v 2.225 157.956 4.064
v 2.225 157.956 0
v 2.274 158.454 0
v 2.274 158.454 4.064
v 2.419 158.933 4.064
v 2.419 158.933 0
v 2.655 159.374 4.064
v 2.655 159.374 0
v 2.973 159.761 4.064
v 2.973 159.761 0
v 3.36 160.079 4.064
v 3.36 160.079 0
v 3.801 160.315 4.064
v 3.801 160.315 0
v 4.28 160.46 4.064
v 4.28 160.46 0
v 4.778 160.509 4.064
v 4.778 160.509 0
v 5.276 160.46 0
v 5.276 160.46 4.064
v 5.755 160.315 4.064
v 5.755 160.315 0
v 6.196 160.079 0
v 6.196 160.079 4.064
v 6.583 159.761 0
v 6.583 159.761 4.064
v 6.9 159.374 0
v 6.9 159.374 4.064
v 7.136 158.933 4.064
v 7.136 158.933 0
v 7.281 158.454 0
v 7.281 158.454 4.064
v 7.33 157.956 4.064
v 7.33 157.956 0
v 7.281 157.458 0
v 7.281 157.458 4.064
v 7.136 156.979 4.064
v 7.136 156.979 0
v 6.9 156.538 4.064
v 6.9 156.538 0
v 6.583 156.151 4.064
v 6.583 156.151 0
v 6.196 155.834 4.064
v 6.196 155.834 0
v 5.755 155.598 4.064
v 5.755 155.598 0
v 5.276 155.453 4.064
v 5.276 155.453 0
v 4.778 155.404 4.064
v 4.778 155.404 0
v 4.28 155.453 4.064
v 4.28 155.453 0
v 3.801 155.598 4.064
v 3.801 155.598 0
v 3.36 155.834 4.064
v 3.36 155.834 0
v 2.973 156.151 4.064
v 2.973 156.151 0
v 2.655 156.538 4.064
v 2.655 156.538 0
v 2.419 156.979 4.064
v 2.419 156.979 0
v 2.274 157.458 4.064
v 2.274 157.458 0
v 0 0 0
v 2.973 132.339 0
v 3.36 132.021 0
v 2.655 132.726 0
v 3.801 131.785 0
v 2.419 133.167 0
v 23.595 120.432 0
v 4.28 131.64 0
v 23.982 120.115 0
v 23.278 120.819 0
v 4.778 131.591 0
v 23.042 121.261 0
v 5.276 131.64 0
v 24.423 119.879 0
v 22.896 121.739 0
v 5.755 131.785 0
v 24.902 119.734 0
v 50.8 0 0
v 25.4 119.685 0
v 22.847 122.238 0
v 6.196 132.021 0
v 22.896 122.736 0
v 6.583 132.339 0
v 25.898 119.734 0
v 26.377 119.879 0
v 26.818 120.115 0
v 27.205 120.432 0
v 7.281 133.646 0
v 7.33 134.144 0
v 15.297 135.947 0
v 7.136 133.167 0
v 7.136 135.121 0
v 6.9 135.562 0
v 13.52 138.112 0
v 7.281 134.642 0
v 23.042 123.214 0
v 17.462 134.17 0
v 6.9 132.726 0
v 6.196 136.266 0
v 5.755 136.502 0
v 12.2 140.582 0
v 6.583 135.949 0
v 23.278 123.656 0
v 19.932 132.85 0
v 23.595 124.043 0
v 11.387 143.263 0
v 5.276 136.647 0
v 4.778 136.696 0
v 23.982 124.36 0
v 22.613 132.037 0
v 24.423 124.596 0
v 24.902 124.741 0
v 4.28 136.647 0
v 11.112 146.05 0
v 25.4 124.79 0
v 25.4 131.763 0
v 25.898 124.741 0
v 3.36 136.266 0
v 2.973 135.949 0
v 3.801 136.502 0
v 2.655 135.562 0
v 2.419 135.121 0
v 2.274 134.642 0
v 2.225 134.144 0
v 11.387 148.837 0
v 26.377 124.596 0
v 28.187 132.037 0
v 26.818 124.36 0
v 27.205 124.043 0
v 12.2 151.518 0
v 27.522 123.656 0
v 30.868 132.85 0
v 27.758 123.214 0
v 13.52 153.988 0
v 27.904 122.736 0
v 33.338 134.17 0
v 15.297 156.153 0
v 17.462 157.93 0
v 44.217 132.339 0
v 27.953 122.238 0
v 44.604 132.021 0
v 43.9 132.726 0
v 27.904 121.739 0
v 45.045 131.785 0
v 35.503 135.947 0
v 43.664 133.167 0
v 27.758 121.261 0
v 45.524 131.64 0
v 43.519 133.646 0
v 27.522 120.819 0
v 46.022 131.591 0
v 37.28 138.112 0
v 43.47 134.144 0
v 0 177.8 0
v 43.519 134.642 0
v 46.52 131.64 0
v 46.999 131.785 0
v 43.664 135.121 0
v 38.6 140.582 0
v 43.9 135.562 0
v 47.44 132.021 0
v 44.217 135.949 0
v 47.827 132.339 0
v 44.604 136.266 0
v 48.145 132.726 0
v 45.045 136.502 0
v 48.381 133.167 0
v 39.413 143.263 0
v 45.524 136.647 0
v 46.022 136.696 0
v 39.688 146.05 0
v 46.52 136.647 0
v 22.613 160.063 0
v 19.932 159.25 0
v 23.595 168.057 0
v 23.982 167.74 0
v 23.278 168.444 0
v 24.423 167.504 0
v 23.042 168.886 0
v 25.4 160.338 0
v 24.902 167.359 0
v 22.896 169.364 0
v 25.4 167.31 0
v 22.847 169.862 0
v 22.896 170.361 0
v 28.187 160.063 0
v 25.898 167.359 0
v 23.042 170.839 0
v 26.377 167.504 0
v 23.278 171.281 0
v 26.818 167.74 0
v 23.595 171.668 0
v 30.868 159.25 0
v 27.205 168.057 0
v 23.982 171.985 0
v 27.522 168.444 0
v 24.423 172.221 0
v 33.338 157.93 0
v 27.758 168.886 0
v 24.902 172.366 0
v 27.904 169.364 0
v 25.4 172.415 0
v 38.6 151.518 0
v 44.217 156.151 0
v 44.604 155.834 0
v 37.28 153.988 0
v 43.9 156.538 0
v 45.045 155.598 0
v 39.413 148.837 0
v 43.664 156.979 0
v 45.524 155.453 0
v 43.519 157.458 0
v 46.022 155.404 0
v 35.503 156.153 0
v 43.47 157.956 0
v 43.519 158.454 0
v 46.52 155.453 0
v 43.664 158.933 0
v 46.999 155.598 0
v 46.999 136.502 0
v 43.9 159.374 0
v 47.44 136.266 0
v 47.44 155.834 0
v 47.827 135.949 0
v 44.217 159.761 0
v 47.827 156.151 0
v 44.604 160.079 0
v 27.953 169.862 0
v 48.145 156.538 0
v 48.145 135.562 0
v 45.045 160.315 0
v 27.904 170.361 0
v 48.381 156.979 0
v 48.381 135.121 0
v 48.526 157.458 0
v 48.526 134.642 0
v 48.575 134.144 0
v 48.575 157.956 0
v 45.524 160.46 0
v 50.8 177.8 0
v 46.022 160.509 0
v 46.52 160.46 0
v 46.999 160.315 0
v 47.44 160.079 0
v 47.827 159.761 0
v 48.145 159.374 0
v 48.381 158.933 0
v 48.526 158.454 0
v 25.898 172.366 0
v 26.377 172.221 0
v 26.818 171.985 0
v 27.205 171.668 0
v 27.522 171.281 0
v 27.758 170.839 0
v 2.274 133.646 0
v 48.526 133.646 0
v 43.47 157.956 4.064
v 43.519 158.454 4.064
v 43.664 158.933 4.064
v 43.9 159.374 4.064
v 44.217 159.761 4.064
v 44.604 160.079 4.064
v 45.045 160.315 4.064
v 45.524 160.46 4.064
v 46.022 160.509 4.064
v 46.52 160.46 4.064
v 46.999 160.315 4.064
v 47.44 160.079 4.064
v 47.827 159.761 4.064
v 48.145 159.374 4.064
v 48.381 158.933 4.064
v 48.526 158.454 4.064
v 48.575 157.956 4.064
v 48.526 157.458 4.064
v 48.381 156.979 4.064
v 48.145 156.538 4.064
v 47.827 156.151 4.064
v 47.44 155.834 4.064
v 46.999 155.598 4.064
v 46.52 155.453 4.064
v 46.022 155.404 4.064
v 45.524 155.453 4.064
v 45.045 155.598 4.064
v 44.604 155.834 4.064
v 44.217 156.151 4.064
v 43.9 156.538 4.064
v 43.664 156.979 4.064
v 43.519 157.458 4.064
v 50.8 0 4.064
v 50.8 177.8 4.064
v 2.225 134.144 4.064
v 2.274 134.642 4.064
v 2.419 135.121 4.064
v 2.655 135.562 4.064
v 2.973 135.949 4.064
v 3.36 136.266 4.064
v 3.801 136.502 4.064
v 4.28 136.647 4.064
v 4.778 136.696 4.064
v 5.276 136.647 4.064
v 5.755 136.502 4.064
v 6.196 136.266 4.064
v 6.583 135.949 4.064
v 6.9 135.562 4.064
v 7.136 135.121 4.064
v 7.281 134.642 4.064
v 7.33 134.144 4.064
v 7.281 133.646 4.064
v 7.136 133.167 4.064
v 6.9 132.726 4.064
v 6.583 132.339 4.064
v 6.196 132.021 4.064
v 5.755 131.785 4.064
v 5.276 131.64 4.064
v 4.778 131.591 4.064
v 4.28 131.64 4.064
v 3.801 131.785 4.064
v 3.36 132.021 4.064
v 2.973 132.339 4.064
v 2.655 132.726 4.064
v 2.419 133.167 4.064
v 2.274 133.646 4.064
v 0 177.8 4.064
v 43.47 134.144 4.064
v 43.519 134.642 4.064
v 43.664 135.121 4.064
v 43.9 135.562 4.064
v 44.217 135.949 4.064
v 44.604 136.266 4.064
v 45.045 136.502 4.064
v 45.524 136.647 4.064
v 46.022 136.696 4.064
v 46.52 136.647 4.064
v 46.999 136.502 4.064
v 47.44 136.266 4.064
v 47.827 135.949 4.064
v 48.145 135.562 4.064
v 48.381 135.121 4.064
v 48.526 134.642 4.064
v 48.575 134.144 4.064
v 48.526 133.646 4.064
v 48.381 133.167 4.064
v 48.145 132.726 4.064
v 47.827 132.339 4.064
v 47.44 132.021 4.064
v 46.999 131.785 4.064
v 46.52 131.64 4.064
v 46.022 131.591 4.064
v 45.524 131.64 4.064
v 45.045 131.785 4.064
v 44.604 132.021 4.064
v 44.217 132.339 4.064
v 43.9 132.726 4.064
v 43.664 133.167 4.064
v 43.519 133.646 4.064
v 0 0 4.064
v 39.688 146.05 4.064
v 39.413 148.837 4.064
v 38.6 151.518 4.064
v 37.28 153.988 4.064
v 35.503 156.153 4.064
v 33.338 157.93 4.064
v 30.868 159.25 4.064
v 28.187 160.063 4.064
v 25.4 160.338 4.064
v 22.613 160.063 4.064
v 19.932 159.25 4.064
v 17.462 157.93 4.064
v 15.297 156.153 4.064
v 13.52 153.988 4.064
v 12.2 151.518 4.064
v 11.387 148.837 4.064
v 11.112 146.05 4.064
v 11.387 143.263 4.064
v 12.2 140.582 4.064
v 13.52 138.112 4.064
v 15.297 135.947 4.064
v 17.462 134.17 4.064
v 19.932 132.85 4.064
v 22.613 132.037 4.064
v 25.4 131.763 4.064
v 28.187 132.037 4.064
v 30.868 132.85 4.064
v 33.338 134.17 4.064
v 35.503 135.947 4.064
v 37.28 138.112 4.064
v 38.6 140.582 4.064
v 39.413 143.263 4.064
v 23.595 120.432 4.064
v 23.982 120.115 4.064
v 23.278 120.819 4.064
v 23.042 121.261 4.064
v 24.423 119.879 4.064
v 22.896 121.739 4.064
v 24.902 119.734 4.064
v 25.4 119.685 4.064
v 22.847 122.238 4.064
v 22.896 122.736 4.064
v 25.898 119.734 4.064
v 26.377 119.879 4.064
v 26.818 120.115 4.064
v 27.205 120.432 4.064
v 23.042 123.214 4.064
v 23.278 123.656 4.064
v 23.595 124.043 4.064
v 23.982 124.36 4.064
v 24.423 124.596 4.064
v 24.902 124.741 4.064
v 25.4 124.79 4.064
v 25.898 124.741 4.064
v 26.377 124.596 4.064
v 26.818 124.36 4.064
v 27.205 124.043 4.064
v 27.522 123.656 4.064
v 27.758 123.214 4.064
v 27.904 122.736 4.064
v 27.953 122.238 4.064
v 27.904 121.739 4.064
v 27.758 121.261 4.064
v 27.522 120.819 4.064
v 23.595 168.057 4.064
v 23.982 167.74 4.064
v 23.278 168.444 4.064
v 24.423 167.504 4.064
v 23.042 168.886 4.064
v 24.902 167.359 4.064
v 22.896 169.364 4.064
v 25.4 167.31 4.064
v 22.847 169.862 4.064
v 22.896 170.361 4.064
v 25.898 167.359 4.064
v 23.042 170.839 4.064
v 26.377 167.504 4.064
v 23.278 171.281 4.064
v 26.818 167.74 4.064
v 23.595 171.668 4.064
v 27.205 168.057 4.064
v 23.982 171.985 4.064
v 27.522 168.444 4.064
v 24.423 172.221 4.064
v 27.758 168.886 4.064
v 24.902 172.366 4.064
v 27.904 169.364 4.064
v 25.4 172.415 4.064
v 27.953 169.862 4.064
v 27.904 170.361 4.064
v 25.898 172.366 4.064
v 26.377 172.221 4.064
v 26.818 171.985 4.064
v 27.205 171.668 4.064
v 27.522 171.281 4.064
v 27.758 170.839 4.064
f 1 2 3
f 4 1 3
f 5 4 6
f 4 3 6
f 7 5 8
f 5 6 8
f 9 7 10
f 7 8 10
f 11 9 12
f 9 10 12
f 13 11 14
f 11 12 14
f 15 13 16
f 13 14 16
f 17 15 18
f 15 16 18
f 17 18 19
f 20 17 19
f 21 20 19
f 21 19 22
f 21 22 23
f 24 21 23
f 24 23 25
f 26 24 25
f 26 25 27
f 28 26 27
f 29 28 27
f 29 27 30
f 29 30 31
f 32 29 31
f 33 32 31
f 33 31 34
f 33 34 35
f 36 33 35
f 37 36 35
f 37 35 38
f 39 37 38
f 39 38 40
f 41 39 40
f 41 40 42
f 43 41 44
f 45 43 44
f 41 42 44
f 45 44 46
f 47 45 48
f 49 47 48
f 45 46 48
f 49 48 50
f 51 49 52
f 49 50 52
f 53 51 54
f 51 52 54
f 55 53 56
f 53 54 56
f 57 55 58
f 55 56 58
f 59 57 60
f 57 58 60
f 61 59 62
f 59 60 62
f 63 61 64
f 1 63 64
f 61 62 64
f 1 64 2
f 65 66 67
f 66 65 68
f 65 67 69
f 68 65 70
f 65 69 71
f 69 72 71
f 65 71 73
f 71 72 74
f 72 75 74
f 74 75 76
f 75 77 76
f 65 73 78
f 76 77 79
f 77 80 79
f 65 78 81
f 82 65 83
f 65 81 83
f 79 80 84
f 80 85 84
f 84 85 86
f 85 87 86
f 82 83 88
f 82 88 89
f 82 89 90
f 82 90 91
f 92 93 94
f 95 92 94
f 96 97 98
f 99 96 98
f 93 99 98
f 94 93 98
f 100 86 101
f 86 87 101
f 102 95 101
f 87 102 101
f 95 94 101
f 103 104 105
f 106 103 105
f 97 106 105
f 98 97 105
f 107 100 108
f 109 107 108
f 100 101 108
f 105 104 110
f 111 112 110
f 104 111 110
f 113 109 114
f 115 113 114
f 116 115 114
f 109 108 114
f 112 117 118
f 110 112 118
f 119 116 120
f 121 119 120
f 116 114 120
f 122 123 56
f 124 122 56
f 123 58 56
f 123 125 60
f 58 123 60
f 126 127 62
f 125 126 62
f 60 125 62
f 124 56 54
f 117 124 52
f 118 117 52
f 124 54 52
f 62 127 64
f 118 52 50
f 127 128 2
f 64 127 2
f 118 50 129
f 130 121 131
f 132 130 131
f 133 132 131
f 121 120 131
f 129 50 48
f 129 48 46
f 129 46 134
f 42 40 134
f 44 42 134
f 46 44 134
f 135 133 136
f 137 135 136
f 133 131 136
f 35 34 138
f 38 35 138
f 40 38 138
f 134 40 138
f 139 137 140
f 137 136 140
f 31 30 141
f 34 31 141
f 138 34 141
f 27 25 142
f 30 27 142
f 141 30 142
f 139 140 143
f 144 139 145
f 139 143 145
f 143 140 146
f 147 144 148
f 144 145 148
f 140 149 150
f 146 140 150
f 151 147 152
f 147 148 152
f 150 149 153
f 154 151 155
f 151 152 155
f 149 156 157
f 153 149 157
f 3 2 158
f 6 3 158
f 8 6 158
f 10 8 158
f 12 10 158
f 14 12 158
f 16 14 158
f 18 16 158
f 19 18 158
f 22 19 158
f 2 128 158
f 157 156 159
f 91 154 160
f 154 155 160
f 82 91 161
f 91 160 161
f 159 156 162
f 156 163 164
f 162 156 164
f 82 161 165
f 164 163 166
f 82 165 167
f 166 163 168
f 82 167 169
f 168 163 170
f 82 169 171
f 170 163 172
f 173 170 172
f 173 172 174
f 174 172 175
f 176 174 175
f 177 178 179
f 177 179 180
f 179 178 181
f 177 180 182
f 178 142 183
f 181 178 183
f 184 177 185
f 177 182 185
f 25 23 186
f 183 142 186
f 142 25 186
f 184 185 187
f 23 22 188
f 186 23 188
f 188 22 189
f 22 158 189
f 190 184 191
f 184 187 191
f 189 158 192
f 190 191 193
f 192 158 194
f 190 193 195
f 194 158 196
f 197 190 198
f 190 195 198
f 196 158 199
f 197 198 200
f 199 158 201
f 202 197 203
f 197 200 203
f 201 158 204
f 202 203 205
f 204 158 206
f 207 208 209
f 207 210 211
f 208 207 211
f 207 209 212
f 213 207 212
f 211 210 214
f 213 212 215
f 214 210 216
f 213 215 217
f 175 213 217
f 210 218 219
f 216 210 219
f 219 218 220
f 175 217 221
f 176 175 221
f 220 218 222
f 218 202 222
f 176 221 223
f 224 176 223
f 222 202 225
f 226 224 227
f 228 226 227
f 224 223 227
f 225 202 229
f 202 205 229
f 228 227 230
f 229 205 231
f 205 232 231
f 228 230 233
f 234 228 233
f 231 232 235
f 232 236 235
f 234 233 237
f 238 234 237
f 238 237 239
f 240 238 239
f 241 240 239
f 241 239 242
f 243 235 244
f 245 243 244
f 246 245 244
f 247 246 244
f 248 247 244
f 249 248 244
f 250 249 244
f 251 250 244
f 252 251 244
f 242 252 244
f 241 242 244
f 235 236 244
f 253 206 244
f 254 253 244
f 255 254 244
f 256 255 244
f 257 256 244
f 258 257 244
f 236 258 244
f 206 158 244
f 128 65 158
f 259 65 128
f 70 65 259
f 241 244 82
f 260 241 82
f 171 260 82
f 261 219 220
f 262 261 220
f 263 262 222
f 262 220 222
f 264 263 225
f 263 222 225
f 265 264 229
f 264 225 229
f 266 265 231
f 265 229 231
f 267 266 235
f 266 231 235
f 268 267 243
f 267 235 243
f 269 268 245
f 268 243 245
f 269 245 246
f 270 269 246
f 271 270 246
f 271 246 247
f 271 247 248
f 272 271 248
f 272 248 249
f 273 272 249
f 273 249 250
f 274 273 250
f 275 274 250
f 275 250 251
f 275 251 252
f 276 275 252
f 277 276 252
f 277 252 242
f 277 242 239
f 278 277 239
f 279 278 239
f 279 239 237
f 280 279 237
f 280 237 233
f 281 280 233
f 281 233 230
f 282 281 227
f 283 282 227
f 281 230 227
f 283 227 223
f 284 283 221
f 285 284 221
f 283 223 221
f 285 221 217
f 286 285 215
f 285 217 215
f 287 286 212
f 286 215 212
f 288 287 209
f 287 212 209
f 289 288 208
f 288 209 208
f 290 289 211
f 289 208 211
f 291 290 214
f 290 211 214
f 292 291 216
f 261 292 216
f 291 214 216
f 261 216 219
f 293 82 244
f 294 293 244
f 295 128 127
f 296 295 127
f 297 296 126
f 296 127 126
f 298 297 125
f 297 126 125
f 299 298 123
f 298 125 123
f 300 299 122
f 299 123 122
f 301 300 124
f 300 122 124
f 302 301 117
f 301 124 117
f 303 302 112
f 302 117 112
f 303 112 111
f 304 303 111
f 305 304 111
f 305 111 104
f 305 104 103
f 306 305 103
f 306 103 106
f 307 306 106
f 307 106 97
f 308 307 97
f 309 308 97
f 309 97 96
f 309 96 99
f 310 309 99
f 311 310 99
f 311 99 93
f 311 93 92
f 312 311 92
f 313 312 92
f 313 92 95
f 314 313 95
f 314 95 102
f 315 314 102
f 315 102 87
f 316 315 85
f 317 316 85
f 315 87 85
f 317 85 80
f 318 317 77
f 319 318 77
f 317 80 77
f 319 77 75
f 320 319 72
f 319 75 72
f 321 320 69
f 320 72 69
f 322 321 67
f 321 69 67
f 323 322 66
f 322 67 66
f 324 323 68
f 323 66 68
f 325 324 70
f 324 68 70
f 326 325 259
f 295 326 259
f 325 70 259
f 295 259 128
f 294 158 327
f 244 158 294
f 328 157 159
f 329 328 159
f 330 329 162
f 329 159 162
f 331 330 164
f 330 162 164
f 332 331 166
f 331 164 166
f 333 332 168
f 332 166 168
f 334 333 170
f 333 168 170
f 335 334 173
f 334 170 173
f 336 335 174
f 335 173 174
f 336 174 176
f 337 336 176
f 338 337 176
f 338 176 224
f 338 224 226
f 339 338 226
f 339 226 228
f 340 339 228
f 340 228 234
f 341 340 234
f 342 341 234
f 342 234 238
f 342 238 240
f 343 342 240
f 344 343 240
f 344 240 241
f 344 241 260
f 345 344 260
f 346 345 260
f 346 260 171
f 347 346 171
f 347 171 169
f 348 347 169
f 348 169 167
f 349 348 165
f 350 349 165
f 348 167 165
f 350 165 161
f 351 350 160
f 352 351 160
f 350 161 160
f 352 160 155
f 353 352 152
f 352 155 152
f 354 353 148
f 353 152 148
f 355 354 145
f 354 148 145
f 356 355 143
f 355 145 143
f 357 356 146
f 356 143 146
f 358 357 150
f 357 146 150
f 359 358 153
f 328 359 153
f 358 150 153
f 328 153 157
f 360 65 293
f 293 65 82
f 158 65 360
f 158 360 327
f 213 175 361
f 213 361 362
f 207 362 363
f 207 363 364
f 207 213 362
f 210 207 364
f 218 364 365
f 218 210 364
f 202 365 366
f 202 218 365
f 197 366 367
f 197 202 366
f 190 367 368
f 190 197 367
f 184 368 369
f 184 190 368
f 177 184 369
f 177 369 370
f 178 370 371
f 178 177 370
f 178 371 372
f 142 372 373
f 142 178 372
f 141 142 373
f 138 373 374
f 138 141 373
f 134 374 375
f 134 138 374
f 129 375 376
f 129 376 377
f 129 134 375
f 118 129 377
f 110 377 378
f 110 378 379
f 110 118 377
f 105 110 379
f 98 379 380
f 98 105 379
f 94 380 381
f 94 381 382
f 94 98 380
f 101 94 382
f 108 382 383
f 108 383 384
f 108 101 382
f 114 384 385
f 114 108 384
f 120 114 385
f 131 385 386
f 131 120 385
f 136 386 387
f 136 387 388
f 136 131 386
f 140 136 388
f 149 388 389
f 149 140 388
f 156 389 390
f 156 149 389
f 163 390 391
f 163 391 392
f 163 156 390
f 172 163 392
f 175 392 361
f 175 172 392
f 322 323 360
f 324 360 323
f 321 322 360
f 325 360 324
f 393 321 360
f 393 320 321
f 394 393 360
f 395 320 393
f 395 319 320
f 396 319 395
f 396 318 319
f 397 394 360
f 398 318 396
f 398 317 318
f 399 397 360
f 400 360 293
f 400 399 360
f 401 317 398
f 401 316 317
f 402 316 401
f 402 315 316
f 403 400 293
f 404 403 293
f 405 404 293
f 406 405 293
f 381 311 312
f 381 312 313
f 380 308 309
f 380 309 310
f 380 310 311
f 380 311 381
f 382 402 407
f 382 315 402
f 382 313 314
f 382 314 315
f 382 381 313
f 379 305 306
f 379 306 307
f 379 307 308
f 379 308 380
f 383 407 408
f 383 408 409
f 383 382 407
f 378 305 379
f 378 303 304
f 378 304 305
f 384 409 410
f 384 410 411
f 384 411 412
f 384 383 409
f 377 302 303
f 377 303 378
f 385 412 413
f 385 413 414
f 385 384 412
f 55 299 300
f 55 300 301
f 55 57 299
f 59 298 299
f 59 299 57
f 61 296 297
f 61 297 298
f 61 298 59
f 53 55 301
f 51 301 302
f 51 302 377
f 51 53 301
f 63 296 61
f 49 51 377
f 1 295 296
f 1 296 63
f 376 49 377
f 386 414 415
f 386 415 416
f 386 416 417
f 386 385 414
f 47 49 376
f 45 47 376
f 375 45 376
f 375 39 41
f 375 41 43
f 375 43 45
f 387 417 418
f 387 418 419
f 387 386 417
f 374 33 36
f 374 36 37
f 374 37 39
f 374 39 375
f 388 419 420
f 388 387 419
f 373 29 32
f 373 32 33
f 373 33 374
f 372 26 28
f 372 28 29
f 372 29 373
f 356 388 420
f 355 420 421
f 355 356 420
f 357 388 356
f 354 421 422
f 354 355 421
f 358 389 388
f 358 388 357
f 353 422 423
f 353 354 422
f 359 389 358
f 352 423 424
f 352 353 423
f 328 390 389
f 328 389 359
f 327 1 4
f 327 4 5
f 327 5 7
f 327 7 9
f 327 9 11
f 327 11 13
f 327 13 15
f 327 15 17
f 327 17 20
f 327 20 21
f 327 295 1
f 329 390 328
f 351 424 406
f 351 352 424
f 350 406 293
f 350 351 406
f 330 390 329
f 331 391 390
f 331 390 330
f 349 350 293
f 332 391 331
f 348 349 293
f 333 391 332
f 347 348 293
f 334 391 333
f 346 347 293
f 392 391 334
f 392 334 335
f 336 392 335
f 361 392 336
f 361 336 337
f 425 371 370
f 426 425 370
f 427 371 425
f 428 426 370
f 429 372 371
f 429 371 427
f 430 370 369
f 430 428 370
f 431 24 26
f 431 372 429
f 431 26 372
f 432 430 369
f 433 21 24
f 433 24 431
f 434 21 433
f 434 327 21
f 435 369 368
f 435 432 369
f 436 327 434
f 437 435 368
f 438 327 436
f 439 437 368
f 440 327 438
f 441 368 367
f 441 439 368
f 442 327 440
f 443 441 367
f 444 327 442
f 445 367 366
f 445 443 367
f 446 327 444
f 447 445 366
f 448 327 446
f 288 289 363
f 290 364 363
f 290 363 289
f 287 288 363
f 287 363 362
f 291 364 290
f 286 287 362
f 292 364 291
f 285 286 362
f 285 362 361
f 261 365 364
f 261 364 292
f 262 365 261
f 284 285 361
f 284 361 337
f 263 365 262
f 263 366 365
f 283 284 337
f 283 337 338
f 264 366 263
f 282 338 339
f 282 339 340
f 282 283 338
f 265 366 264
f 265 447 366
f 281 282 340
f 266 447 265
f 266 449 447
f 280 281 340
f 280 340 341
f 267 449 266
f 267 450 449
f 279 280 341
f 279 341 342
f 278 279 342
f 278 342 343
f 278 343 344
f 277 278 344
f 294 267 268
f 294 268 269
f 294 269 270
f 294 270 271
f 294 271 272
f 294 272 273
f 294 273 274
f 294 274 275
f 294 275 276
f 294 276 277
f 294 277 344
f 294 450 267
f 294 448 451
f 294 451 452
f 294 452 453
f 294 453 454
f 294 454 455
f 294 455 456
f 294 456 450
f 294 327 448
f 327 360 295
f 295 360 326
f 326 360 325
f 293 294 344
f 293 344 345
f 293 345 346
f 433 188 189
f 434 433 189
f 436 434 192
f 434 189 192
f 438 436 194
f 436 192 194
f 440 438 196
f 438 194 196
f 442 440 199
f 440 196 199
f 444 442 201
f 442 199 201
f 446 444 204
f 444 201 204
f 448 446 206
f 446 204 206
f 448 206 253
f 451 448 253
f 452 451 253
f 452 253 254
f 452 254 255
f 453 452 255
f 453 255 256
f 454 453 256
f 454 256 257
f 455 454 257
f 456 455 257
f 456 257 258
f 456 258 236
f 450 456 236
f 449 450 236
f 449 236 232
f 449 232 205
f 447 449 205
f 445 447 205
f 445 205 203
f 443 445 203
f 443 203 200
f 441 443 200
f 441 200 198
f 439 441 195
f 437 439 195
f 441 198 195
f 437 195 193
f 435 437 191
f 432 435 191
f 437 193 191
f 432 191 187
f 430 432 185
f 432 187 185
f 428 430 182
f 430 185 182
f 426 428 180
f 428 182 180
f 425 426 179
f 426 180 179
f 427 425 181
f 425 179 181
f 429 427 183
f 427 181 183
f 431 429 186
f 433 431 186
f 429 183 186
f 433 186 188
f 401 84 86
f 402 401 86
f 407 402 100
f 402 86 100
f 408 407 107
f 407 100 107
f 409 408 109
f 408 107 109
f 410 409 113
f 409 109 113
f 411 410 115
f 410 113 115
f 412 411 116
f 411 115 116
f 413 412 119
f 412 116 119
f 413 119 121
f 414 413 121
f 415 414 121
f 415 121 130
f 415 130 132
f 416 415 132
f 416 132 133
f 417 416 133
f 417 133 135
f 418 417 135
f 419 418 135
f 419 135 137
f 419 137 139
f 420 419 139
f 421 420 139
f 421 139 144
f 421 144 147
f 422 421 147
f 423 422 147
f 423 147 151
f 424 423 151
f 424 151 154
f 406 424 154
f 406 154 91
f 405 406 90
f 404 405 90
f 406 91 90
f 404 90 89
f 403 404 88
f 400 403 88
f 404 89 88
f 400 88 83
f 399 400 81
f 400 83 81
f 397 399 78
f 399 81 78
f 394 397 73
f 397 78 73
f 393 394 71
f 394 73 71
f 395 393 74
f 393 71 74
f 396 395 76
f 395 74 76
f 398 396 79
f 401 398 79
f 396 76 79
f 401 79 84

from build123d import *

# Parameters (mm, degrees)
SKETCH2_W              = 50.8
SKETCH2_H              = 177.8
SKETCH2_R              = 14.2875
BOSS_EXTRUDE1_DEPTH    = 4.064
F_10_CLEARANCE_HOLE1_D = 5.1054


with BuildPart() as part:
    # Sketch2 → Boss-Extrude1 (new body)
    with BuildSketch(Plane.XY):
        with Locations((25.4, 88.9)):
            Rectangle(SKETCH2_W, SKETCH2_H)
        with Locations((25.4, 146.05)):
            Circle(SKETCH2_R, mode=Mode.SUBTRACT)
    extrude(amount=BOSS_EXTRUDE1_DEPTH)

    # #10 Clearance Hole1 (through all)
    with Locations(Plane.XY.offset(4.064)):
        with Locations((46.022229928, 157.95625), (25.4, 169.8625), (4.777770072, 157.95625), (4.777770072, 134.14375), (25.4, 122.2375), (46.022229928, 134.14375)):
            Hole(F_10_CLEARANCE_HOLE1_D / 2)


solid = part.part
